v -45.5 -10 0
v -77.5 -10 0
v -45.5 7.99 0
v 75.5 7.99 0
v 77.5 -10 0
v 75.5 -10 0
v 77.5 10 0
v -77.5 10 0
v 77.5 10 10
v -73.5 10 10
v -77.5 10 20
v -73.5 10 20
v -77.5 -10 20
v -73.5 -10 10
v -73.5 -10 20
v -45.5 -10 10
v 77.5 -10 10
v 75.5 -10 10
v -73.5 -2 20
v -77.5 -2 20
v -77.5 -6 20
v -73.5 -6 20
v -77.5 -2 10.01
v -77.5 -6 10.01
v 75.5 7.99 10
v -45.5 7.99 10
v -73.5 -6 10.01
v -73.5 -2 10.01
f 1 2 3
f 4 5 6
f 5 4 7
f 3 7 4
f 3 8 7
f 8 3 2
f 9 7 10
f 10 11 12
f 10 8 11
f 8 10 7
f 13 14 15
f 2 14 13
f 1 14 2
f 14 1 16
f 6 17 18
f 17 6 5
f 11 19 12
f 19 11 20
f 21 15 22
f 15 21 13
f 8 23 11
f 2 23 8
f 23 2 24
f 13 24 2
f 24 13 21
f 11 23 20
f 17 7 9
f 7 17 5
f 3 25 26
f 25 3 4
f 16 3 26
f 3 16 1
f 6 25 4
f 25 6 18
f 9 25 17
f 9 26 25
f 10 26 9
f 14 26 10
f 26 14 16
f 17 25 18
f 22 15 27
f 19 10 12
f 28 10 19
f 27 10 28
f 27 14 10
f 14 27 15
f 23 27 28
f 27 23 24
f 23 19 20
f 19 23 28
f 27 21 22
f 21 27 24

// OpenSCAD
/* Wanhao i3 V2.., Monoprice Maker Select V2 et al USB cable retainer */
/* By Luther Barber */
/* Parameters for Thingiverse customizer */

// The size of the slot for the cable (in mm), allowing for print shrinkage, etc.
Cable_diameter = 4; // [2,3,4,5,6]

// The length (in mm)of the USB cable housing & strain relief from the case to the cable.
Cable_collar_to_case = 28; // [20:1:40]

// Adjustment to the 120mm case size (in mm) to allow for print shrinkage, etc.
Case_width_tolerance = 1; // [-2,-1,0,1,2,3]

/* [Hidden] */
// All remaining parameters probably will not need to be changed
Prong_size = 4;
Prong_length = 10;
Cable_distance_from_top = 10;

Clip_width = 10;
Clip_thickness = 2;
Case_width = 120 + Case_width_tolerance;
Slop = .01; // extra amount only to make cutouts clear

/* Code */

Overall_length = Clip_thickness + Case_width + Cable_collar_to_case + Prong_size;
Overall_height = Clip_thickness + Cable_distance_from_top + Cable_diameter + Prong_size;
Overall_width = Clip_width + Prong_length;

/* Create a box of the overall size. Then carve out a gap
/* for the control box, discard the space up to the prongs,
/* and remove the gap between the prongs.
/* Rotate the model for the desired printing orientation.
/* Translate it to start on the z plane, extend along the x axis, and be roughly centered */
translate ([Overall_length / 2, - Overall_width / 2 , Overall_height]) {
    rotate ([0, 90, 90]){    // for printing direction
        difference() {
            difference () {
                difference (){
                    // Cuboid of the overall size
                    cube([Overall_width, Overall_length, Overall_height]);
                    // Less the cutout for the control box
                    translate([-Slop, Clip_thickness, -Slop]){
                        cube([Overall_width + (2 * Slop), Case_width, Overall_height - Clip_thickness]);
                    }
                }
                // Less the volume behind the prongs
                translate ([-Slop, -Slop, -Slop]) {
                    cube([Prong_length + Slop, Overall_length - Prong_size + Slop, Overall_height + (2 * Slop)]);
                }
            }
            // and finally remove the gap between the prongs
            translate ([-Slop, Slop, Prong_size]) {
                cube([Prong_length, Overall_length, Cable_diameter]);
            }
        }   
    }
}
